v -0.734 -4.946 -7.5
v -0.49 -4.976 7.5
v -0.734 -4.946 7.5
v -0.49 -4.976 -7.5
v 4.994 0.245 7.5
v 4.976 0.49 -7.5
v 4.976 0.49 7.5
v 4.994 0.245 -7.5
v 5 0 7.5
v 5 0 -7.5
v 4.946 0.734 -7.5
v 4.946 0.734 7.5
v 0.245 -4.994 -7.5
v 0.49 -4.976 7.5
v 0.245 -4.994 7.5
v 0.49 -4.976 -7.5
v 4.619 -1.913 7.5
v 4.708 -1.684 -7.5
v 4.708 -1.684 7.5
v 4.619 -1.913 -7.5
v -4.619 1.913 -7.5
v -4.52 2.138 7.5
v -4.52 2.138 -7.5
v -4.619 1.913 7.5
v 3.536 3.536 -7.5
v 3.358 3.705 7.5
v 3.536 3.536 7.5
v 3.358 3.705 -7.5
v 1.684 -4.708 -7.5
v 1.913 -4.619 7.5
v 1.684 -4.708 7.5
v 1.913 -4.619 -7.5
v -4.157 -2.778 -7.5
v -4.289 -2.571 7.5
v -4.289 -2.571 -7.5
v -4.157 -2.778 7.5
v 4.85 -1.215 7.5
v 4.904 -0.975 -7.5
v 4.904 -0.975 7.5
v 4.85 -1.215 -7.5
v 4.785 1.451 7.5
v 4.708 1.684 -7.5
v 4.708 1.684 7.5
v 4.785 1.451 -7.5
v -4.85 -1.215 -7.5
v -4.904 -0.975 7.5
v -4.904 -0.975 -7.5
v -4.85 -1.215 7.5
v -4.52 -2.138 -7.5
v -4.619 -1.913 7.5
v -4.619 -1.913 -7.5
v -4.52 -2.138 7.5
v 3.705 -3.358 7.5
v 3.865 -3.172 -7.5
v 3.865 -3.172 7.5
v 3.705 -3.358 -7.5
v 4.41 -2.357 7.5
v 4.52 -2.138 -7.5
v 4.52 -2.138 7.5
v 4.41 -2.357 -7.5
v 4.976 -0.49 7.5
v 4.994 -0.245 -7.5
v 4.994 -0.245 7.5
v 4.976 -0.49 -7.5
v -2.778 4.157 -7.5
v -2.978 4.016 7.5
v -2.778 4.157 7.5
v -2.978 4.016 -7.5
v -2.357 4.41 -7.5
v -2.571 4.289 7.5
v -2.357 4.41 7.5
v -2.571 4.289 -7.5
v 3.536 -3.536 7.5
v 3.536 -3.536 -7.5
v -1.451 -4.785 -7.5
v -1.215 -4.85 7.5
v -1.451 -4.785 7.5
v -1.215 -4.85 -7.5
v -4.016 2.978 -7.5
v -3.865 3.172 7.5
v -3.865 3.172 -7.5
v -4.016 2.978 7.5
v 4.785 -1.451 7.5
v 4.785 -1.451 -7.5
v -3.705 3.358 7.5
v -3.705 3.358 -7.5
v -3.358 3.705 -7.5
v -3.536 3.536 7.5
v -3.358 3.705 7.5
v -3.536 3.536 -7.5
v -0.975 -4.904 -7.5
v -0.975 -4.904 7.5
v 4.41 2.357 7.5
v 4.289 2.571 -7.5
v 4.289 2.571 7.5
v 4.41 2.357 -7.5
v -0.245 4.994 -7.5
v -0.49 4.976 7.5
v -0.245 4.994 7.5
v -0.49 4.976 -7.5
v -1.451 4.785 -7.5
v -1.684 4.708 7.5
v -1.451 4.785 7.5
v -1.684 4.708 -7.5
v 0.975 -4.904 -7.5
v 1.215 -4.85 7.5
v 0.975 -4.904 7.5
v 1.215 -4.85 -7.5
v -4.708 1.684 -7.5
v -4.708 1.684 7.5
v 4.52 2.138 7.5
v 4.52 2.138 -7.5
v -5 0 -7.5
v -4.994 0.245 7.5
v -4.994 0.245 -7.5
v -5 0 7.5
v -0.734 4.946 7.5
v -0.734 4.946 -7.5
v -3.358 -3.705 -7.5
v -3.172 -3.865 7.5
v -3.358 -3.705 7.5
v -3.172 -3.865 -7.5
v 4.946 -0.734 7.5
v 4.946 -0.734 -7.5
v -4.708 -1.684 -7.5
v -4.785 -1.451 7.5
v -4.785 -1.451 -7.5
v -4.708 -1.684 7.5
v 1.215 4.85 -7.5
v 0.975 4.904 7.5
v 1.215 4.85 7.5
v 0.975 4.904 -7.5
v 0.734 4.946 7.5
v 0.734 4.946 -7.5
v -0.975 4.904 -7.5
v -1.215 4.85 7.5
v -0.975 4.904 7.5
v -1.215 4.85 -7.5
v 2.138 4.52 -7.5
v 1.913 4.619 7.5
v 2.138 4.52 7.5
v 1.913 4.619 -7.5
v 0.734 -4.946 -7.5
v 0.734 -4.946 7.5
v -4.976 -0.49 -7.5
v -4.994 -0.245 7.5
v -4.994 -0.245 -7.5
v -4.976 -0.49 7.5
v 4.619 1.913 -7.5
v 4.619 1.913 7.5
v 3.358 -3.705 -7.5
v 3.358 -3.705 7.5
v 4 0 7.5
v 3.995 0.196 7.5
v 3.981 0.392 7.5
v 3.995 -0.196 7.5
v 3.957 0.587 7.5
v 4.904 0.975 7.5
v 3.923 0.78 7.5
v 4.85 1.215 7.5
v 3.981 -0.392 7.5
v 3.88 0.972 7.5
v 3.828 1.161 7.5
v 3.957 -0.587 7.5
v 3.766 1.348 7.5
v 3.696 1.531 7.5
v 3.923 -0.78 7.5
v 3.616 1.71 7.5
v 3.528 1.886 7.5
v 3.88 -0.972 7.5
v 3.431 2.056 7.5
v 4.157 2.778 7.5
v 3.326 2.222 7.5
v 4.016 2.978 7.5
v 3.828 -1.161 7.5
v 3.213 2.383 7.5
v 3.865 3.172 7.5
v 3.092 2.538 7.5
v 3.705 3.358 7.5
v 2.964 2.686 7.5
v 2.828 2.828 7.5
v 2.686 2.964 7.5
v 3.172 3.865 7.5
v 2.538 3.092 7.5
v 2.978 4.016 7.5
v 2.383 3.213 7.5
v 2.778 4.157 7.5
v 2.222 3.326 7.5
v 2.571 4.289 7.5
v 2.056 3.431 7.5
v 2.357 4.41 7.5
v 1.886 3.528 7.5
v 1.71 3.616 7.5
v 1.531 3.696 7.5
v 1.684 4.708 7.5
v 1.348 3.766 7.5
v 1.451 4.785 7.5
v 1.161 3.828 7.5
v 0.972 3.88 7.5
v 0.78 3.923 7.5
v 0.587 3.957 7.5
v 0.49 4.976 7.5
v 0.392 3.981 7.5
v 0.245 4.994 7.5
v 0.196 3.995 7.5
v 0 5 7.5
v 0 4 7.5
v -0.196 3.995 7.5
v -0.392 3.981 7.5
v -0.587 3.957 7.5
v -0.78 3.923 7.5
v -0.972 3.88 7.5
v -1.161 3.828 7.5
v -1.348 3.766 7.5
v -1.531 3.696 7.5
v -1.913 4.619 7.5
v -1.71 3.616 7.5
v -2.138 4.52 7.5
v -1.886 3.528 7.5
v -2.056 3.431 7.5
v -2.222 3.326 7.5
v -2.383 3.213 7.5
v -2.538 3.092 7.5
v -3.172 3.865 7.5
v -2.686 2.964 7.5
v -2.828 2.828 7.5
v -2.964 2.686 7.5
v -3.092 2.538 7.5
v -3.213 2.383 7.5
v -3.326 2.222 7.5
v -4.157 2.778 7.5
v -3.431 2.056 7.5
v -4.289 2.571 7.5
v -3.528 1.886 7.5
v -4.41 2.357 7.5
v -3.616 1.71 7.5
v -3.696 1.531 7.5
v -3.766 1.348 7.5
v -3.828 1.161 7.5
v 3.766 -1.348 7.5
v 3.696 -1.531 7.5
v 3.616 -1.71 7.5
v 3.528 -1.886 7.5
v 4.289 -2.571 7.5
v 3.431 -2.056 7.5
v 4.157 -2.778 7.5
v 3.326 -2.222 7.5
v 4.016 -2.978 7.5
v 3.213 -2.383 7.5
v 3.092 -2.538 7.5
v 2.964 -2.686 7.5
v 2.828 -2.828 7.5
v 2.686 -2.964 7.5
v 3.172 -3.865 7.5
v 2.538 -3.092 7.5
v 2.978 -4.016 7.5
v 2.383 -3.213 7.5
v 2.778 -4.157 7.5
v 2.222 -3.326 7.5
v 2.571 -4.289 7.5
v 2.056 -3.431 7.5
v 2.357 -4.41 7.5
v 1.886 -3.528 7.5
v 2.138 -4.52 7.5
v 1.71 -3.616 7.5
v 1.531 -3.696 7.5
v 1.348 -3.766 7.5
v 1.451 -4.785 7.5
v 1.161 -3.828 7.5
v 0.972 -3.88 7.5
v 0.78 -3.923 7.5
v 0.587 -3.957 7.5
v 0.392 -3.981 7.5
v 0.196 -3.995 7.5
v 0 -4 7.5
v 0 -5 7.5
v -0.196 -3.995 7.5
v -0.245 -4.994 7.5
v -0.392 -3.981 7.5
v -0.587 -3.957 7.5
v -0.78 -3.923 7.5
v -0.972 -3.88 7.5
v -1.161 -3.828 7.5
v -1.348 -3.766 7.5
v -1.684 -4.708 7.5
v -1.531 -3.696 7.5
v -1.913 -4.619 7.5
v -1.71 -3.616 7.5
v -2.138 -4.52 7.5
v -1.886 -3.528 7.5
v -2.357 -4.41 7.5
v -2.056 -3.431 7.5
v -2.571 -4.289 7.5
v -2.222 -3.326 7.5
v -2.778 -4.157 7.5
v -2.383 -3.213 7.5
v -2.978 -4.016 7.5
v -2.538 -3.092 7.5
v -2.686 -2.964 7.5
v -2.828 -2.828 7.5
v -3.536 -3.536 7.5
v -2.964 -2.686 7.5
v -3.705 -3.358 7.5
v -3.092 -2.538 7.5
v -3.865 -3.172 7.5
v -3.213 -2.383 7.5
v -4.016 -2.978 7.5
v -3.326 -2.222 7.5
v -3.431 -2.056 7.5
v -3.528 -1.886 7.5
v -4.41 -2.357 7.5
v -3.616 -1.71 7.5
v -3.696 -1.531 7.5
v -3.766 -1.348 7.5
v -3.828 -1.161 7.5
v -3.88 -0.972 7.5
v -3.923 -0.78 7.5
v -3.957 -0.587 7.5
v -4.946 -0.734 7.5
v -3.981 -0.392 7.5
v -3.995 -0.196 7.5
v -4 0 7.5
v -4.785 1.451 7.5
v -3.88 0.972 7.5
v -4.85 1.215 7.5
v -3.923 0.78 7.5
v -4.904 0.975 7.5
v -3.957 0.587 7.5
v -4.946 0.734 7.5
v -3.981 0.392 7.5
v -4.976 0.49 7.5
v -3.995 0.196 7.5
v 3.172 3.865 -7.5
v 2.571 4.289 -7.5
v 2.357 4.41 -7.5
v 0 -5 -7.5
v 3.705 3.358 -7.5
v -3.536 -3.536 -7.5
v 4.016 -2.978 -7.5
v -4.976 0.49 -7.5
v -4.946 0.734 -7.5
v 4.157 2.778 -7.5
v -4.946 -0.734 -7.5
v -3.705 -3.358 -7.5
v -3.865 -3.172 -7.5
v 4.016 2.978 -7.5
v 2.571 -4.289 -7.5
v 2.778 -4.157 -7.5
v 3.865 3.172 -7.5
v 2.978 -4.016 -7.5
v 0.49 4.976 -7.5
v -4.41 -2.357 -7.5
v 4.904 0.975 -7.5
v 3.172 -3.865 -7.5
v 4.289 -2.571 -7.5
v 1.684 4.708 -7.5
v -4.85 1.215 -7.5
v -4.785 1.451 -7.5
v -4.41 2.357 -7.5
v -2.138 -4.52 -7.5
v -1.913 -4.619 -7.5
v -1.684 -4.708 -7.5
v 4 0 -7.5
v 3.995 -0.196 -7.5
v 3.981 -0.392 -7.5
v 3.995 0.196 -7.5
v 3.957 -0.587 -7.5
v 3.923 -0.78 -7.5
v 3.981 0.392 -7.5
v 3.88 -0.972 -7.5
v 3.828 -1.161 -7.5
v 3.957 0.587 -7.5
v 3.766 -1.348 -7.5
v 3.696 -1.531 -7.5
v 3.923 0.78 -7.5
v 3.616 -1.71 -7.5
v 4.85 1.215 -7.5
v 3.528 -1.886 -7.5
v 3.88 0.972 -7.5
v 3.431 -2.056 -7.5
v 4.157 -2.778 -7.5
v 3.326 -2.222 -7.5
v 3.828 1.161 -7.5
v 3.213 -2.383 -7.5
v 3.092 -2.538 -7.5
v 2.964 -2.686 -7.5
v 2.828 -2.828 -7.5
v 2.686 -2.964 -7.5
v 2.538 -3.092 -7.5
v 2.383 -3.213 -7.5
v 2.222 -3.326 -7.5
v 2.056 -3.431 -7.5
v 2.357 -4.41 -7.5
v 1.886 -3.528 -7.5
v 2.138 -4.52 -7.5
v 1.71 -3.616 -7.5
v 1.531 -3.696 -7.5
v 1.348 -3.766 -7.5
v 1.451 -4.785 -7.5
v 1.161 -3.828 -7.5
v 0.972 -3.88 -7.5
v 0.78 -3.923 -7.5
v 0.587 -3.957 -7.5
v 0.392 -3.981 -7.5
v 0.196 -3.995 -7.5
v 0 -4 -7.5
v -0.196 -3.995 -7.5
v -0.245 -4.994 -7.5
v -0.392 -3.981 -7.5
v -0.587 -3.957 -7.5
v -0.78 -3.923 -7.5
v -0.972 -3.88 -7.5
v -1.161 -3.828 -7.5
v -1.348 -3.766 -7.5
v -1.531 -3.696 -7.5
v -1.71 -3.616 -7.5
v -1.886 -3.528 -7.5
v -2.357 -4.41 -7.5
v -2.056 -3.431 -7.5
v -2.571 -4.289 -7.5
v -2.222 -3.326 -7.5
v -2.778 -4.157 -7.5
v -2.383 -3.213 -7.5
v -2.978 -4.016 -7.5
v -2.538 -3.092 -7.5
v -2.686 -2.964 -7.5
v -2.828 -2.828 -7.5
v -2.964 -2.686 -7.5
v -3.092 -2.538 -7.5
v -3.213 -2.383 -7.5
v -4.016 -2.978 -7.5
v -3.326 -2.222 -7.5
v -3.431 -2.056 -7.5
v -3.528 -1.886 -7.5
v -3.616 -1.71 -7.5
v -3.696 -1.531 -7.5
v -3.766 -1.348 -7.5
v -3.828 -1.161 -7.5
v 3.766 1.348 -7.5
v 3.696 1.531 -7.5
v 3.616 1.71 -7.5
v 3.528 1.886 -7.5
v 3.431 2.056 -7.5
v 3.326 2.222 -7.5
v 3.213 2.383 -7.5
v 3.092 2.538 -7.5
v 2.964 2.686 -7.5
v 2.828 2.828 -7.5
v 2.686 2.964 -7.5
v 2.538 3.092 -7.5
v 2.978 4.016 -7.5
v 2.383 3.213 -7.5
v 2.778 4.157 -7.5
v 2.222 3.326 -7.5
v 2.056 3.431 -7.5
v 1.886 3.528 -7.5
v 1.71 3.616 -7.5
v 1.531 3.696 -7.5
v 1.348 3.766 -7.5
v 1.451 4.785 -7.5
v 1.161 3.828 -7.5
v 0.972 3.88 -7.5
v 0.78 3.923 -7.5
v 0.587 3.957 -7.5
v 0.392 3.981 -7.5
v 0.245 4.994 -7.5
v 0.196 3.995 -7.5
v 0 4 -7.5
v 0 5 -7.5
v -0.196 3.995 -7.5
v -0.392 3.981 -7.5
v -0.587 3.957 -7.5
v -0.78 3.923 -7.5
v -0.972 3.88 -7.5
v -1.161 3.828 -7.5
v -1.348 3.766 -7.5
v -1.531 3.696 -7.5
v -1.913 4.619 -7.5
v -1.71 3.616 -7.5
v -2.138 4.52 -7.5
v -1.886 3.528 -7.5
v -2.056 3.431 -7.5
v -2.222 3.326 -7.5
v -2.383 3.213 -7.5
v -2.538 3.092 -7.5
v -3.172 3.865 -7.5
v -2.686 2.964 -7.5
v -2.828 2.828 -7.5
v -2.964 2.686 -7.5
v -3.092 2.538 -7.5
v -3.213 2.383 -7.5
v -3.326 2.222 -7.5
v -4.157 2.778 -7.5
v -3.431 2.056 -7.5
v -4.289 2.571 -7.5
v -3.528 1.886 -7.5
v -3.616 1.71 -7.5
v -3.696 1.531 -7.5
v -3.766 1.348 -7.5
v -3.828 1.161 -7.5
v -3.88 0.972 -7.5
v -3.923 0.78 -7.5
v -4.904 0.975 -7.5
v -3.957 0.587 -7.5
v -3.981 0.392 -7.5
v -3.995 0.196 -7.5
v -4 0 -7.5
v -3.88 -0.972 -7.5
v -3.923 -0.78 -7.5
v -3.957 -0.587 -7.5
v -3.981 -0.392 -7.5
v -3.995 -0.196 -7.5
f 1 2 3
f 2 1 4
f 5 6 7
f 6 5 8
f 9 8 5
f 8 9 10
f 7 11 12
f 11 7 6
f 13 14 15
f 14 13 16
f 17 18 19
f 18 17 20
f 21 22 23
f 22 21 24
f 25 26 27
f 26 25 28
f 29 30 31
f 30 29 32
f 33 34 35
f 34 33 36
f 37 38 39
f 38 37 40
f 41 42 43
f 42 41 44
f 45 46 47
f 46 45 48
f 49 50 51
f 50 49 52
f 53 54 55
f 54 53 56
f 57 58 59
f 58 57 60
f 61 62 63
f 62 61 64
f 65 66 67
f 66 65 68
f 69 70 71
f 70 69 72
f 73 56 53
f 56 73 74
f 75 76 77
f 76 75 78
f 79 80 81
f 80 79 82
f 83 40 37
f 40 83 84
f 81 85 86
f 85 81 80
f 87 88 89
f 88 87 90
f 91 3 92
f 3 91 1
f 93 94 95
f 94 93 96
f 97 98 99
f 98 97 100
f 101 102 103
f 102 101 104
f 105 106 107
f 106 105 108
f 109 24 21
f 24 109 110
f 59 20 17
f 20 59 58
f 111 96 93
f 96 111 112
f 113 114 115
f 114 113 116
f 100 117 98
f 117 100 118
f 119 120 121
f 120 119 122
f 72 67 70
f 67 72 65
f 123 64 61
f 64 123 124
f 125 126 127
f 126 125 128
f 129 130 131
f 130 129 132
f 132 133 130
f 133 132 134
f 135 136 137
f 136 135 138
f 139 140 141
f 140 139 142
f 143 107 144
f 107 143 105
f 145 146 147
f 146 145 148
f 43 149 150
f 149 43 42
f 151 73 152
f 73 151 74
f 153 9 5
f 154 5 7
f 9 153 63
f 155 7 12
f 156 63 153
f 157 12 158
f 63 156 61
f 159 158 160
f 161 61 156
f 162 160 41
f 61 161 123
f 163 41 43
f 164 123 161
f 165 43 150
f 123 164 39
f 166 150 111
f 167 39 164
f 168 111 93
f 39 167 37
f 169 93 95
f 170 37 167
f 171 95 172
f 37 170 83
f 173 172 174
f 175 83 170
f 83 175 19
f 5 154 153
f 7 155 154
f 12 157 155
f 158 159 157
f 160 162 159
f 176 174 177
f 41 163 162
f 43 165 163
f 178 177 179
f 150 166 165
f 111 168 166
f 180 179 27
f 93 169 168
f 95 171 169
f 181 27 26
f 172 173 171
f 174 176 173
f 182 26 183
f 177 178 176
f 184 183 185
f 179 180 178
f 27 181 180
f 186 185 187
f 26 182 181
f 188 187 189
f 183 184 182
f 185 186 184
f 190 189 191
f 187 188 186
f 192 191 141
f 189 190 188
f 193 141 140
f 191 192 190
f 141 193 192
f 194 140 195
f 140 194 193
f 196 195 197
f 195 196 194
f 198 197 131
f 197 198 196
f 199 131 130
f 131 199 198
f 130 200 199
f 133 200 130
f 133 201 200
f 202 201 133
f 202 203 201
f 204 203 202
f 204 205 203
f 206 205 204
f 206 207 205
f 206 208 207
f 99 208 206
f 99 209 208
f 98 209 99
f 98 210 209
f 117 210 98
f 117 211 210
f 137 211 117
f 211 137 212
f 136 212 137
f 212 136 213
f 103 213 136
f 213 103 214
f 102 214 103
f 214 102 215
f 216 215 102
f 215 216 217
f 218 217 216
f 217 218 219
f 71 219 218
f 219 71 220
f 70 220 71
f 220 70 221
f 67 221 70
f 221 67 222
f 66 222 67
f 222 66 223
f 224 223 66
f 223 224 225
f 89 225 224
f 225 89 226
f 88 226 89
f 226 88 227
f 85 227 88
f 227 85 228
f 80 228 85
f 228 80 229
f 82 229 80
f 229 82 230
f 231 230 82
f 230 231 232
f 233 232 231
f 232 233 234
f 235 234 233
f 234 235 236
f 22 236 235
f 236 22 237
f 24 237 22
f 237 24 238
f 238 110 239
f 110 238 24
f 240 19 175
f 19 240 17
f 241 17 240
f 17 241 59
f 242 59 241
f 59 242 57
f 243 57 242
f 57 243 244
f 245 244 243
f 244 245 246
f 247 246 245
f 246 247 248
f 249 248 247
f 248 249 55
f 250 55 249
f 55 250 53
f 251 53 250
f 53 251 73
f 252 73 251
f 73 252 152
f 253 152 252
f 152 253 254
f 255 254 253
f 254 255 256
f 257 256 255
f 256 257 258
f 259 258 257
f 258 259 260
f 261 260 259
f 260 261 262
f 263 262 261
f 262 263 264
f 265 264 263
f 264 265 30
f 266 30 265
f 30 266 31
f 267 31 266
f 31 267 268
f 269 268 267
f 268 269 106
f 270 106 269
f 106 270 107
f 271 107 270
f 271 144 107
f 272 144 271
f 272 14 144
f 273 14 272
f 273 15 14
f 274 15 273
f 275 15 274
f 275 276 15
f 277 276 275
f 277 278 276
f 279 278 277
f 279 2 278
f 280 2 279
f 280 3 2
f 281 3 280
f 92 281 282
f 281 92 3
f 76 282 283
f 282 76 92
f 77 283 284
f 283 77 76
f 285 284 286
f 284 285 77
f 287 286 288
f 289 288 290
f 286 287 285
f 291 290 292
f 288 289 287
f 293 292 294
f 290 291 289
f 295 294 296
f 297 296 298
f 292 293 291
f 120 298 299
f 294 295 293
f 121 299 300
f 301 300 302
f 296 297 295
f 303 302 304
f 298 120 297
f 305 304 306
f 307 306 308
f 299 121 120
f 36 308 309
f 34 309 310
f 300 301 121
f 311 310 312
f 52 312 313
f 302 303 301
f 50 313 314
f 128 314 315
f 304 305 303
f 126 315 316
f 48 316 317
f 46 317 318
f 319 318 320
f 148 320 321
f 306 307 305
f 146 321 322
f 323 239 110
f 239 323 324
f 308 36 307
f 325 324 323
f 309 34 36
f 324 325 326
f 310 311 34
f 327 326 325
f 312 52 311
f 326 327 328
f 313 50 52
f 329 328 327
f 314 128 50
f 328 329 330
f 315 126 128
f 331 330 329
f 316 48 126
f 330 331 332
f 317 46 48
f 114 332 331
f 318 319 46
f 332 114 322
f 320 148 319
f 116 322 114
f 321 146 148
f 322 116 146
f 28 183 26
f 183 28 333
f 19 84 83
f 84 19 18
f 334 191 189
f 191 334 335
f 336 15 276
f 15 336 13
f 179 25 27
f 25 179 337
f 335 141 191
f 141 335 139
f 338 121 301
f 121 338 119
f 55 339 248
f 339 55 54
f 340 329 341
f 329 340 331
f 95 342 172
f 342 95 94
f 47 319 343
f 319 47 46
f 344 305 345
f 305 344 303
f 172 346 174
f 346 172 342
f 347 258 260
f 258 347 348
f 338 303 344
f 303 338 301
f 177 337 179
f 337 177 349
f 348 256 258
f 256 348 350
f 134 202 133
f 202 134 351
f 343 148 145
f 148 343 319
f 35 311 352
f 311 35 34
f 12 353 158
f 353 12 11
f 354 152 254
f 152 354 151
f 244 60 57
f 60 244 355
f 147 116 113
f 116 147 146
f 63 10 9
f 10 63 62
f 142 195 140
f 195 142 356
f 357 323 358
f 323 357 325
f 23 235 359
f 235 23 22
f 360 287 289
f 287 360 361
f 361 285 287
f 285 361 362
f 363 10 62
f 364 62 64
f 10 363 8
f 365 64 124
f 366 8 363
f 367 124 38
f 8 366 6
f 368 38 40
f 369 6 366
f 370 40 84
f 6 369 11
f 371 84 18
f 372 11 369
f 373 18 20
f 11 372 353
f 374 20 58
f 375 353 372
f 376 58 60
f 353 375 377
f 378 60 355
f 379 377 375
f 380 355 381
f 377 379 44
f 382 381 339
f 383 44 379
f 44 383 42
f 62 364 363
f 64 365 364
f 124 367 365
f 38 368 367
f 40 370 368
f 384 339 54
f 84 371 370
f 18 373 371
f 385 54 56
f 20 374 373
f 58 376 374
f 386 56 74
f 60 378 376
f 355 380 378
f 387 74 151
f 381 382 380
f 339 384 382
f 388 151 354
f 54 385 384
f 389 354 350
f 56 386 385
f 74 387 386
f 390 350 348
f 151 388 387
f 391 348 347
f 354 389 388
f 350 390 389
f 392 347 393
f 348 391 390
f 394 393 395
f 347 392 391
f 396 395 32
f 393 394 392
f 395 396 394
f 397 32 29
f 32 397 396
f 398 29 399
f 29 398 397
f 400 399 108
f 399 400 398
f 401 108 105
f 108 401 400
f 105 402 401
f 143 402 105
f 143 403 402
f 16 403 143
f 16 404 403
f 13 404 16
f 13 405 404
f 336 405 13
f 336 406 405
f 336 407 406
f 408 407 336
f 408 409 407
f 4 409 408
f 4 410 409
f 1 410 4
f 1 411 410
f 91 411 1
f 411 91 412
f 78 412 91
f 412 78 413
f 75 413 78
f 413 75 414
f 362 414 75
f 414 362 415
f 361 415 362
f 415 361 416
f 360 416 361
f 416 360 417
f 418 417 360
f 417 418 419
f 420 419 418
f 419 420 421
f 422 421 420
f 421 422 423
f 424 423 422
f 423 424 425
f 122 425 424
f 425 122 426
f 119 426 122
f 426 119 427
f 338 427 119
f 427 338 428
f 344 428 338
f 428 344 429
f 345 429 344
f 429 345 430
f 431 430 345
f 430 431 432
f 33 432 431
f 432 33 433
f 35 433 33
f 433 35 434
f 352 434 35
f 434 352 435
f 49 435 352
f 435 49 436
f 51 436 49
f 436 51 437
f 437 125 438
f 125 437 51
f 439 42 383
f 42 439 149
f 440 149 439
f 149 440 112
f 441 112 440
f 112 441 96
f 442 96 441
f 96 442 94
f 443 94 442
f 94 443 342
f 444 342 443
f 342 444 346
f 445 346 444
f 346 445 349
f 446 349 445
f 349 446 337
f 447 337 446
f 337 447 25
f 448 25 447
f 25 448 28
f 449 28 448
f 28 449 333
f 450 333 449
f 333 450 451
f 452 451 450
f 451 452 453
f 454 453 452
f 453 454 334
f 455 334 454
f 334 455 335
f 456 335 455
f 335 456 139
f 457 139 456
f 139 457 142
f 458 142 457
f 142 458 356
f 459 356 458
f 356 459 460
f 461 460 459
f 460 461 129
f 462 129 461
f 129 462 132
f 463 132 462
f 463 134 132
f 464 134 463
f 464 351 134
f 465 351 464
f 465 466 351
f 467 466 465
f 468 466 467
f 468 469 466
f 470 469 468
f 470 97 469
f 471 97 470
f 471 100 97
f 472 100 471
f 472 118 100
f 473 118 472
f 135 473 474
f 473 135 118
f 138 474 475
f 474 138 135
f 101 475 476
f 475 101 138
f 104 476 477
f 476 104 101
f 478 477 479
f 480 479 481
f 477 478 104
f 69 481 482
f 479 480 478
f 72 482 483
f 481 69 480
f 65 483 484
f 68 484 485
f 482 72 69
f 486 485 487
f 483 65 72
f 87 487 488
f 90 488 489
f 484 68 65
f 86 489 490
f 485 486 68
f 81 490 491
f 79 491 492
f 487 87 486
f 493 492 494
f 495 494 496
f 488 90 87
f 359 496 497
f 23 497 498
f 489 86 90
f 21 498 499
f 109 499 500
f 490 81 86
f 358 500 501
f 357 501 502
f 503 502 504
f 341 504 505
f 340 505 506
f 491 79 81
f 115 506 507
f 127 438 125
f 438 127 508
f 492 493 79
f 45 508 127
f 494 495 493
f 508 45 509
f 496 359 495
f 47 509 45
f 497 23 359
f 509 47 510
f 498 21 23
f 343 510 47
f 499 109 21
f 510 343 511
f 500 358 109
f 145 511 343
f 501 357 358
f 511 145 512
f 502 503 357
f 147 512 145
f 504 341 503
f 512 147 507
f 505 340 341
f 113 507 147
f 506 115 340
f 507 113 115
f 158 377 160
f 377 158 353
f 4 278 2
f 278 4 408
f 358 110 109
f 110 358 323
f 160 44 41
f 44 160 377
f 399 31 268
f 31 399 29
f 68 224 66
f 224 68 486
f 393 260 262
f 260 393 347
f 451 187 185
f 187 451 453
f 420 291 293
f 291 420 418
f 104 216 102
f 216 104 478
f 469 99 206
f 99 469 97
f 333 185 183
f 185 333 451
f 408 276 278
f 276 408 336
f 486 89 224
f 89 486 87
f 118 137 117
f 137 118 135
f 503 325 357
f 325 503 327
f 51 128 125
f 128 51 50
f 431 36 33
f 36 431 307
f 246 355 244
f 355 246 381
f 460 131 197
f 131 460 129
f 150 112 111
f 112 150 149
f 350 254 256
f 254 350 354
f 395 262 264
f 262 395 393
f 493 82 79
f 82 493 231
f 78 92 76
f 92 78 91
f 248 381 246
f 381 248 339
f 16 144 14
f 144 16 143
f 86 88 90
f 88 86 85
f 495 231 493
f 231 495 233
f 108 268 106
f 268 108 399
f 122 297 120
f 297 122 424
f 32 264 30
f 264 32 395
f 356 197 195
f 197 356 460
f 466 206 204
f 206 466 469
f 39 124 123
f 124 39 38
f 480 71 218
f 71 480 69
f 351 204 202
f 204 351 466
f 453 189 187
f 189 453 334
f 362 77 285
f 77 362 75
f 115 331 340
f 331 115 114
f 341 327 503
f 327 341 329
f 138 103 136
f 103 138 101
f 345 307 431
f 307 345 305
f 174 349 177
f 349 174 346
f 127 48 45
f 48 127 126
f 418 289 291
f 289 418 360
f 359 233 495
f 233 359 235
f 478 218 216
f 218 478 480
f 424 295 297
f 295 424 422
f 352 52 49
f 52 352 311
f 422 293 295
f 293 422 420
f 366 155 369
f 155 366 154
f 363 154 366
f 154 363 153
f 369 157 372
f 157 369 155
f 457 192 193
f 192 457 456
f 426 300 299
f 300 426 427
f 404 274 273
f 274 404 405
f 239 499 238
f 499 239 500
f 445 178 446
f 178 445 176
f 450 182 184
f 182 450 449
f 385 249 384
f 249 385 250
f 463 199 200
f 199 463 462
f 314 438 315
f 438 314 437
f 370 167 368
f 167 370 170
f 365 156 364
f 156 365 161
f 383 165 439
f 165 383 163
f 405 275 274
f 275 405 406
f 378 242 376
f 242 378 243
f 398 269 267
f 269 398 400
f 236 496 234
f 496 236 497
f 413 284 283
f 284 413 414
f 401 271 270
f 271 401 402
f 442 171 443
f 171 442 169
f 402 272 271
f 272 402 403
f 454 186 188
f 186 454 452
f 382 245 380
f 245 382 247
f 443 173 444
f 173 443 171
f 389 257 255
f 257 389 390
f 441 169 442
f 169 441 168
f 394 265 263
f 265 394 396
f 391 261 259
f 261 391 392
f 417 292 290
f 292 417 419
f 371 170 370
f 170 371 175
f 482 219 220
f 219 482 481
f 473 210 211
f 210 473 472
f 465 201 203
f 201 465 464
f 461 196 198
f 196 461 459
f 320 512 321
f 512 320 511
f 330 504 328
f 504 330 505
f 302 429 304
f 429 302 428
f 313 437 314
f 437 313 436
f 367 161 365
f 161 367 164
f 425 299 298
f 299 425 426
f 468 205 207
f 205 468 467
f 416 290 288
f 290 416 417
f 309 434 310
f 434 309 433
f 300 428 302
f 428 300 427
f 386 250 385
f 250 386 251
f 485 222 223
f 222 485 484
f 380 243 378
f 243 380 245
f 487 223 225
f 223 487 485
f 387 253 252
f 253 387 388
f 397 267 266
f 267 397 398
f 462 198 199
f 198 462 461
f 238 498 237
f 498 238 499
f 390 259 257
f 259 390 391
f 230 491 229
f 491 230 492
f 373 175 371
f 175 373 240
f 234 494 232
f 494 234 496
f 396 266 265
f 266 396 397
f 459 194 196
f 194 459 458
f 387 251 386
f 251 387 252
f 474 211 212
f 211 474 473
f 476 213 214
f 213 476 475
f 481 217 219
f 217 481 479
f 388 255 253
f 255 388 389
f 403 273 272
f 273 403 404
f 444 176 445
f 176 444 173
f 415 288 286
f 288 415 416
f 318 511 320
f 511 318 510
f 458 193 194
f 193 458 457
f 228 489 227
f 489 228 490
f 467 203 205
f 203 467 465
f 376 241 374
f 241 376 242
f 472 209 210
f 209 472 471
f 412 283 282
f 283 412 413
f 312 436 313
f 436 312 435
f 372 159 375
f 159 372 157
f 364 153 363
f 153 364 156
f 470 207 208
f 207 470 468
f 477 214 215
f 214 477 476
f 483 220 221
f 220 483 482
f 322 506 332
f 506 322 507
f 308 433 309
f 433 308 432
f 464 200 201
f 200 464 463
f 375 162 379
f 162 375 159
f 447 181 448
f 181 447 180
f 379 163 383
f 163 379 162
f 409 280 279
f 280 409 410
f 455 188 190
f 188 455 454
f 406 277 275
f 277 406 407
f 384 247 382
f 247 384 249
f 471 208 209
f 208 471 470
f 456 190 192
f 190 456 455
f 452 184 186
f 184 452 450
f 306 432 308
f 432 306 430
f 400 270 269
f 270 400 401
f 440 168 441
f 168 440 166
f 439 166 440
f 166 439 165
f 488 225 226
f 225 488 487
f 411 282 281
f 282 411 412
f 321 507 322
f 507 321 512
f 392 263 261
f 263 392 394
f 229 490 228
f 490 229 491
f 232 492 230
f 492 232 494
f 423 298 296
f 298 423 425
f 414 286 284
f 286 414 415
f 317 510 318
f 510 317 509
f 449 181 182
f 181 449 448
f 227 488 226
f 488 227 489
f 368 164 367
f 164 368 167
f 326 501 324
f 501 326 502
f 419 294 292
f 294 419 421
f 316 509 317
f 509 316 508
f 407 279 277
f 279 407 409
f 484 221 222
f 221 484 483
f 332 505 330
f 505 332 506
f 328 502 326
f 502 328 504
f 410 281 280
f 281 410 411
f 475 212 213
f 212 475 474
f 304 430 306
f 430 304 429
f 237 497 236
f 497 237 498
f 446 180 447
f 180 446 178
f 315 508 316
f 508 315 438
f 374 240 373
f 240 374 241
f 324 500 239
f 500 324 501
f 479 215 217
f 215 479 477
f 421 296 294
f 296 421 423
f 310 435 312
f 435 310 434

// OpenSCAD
// Parameters
length = 15; //[8:30:1]
outer_diameter = 10; //[5:20:0.5]
inner_diameter_original = 8; //[4:18:0.5]
forced_id = 0; //[0:18:0.5]
center = 1; //[0:1:1]
overlap = 1; //[0.5:2:0.5]
id_effective = (forced_id > 0 ? forced_id : inner_diameter_original); //[4:18:0.5]

// Smoothness
$fn = 128;

// Ensure valid wall thickness and non-zero wall
min_wall = 0.2;
id_safe = min(id_effective, outer_diameter - 2*min_wall);

// Tubing - complete geometry
module tubing() {
  color([0.1, 0.1, 0.1]) { // Carbon fiber color
    difference() {
      // Outer tube
      cylinder(h=length, r=outer_diameter/2, center=(center==1));

      // Inner bore: always centered so it fully cuts through regardless of center mode
      cylinder(h=length + 2*overlap, r=id_safe/2, center=true);
    }
  }
}

// Assembly
module assembly() {
  tubing();
}

assembly();
